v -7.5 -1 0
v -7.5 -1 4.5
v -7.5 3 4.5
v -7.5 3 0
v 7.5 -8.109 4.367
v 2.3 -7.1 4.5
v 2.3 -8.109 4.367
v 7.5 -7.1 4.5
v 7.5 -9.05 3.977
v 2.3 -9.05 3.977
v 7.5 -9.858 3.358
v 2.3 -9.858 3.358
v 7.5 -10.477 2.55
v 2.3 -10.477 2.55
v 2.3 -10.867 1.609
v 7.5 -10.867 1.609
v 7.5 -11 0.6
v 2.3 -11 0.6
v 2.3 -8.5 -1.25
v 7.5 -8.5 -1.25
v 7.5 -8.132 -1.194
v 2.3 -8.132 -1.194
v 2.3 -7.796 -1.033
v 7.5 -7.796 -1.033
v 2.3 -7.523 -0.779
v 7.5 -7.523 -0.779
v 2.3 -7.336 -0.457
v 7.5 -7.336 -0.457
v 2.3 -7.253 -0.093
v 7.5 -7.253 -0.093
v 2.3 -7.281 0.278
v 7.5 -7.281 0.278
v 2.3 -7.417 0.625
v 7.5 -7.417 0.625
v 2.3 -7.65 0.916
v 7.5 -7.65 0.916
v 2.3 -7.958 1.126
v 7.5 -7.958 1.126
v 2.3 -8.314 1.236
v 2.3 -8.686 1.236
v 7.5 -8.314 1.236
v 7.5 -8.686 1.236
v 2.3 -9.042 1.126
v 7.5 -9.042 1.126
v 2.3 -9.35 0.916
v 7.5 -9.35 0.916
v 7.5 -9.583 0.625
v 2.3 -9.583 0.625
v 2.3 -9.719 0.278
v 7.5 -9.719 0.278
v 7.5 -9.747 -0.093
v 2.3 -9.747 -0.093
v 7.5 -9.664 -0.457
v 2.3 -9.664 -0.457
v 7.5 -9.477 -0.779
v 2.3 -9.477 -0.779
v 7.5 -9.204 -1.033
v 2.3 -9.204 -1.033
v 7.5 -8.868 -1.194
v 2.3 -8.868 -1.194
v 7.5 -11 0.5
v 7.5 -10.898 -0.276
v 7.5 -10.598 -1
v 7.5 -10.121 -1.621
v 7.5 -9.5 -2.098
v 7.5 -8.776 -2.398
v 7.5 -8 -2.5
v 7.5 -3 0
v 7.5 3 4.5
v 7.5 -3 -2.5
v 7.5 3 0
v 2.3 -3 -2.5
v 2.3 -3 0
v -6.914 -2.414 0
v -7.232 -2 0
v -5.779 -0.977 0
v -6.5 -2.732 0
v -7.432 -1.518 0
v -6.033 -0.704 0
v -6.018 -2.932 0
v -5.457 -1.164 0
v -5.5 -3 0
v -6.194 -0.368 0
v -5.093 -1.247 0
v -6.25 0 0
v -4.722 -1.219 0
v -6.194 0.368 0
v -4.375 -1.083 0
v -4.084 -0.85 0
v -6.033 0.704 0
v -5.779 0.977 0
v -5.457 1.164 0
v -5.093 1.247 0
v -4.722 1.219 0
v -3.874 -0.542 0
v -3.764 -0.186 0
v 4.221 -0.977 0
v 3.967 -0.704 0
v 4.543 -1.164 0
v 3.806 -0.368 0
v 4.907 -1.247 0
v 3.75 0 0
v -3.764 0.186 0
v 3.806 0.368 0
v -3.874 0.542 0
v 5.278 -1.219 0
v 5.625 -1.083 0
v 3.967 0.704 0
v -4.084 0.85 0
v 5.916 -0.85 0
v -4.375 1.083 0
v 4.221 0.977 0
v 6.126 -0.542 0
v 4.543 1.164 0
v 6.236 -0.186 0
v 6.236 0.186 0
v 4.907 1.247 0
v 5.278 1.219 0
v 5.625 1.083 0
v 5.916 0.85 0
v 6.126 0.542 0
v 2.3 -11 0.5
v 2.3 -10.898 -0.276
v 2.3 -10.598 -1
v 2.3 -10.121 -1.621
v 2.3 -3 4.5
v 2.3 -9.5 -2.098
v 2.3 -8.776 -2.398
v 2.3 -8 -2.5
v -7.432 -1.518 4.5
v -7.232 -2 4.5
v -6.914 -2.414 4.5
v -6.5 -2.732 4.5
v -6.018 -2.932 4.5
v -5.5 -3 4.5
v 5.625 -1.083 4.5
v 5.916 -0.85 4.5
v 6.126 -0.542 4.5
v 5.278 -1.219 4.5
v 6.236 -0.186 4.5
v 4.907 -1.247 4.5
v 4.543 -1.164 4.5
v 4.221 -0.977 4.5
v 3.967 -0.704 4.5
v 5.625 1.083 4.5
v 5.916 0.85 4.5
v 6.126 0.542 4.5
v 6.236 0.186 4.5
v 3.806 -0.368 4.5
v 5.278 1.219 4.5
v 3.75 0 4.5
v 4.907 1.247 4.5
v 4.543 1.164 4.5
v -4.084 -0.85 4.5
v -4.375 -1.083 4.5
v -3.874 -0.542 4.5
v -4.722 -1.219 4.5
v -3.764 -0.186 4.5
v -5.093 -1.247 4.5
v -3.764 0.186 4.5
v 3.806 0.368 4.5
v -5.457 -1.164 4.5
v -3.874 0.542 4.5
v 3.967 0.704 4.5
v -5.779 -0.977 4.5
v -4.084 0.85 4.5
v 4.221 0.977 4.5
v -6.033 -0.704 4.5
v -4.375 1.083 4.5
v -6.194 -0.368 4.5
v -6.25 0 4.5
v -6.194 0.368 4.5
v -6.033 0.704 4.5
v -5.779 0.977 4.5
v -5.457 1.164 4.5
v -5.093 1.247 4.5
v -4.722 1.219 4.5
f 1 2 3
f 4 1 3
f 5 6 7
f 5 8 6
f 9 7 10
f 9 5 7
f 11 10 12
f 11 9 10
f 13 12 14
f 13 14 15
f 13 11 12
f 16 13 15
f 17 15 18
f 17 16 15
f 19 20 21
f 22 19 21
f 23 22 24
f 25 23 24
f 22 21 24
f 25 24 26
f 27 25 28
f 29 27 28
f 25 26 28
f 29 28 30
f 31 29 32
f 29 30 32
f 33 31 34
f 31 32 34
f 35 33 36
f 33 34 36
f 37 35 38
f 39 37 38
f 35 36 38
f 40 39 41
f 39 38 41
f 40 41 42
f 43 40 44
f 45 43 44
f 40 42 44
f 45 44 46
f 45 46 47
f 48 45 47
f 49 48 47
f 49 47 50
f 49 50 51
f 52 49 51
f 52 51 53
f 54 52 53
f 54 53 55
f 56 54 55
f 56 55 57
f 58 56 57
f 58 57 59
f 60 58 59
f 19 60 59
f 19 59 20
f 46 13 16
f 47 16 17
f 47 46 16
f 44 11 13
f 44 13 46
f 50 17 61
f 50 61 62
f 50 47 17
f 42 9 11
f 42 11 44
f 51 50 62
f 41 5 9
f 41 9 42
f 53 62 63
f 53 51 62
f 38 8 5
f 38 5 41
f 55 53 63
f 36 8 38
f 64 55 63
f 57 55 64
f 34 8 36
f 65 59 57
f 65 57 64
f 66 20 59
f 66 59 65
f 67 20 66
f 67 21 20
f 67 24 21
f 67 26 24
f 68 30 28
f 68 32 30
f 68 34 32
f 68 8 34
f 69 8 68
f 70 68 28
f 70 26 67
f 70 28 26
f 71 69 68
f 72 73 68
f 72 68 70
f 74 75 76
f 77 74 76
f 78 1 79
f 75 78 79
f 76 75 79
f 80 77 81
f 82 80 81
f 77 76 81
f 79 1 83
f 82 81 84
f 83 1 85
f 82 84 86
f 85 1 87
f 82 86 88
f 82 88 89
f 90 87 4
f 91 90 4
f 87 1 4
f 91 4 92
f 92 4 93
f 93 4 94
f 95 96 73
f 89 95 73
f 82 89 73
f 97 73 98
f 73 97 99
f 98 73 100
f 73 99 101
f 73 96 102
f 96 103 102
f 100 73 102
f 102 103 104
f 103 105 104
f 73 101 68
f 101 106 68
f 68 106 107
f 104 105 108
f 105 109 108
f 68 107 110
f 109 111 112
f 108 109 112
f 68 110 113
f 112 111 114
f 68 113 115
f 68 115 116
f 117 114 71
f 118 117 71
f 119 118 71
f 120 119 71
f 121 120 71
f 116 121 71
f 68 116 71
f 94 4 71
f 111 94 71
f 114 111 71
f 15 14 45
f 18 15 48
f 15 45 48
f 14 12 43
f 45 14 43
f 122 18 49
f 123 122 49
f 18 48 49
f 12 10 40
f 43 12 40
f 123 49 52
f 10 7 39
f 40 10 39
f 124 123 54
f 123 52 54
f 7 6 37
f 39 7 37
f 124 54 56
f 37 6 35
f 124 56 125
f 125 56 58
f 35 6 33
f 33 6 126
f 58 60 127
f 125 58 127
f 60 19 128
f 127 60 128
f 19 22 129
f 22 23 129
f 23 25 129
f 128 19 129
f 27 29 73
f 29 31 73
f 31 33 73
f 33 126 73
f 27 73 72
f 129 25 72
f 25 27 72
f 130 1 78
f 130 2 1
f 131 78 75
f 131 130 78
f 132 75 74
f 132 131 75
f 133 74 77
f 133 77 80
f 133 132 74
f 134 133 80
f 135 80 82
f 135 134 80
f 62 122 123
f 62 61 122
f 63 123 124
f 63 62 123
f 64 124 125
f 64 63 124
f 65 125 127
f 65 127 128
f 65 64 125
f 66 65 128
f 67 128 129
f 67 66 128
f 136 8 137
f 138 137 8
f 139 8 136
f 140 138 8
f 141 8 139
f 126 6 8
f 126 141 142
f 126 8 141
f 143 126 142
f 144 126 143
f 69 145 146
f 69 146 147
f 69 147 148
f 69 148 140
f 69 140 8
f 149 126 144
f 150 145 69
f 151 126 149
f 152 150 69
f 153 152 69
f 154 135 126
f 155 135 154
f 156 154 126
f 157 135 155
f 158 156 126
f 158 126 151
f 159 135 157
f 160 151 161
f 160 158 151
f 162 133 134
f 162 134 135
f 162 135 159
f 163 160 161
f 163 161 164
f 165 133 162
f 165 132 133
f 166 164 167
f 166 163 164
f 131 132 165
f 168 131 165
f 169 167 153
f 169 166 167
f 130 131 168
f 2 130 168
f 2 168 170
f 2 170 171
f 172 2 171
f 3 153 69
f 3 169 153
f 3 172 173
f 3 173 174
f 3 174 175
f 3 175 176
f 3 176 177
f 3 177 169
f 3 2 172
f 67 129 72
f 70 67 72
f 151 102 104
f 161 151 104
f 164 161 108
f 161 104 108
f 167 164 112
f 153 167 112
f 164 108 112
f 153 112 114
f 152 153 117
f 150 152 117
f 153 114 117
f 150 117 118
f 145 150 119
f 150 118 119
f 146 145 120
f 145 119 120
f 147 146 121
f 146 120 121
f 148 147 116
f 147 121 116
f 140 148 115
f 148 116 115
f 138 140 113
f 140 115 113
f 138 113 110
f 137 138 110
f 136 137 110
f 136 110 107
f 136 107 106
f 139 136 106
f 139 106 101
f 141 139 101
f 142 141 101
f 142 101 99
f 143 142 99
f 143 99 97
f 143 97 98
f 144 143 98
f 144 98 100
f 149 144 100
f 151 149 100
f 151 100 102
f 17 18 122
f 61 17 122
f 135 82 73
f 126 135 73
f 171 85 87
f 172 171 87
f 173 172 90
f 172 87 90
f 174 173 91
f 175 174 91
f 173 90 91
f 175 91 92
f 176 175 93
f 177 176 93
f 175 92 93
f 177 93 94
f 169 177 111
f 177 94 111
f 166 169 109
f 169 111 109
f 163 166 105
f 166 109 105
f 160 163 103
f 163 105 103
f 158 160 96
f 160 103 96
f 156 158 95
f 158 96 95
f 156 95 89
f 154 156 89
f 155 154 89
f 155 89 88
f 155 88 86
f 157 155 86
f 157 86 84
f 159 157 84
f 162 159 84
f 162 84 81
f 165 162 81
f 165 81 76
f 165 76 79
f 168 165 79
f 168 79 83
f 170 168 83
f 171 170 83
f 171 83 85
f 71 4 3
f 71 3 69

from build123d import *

# Parameters (mm, degrees)
SKETCH_1_W         = 15
SKETCH_1_H         = 6
EXTRUDE_1_DEPTH    = 4.5
HOLE_WIZARD_M3_1_D = 2.5
EXTRUDE_START      = 2.3
SKETCH_5_W         = 7
SKETCH_5_H         = 8
EXTRUDE_2_DEPTH    = 5.2
FILLET_1_R         = 3.9
FILLET_2_R         = 3
HOLE_WIZARD_M3_2_D = 2.5
FILLET_3_R         = 2


with BuildPart() as part:
    # 草图1 → 凸台-拉伸1 (new body)
    with BuildSketch(Plane.XY):
        Rectangle(SKETCH_1_W, SKETCH_1_H)
    extrude(amount=EXTRUDE_1_DEPTH)

    # M3 螺纹孔1 (through all)
    with Locations(Plane.XY.offset(4.5)):
        with Locations((-5, 0), (5, 0)):
            Hole(HOLE_WIZARD_M3_1_D / 2)

    # 草图5 → 凸台-拉伸2 (add)
    with BuildSketch(Plane(origin=(0, 0, 0), x_dir=(0, 0, -1), z_dir=(1, 0, 0)).offset(EXTRUDE_START)):
        with Locations((-1, -7)):
            Rectangle(SKETCH_5_W, SKETCH_5_H)
    extrude(amount=EXTRUDE_2_DEPTH)

    # 圆角1
    fillet_1_edges = [part.edges().sort_by_distance(p)[0] for p in [
        (4.9, -11, 4.5),
    ]]
    fillet(fillet_1_edges, radius=FILLET_1_R)

    # 圆角2
    fillet_2_edges = [part.edges().sort_by_distance(p)[0] for p in [
        (4.9, -11, -2.5),
    ]]
    fillet(fillet_2_edges, radius=FILLET_2_R)

    # M3 螺纹孔2 (through all)
    with Locations(Plane.ZY.offset(-2.3)):
        with Locations((0, -8.5)):
            Hole(HOLE_WIZARD_M3_2_D / 2)

    # 圆角3
    fillet_3_edges = [part.edges().sort_by_distance(p)[0] for p in [
        (-7.5, -3, 2.25),
    ]]
    fillet(fillet_3_edges, radius=FILLET_3_R)


solid = part.part
